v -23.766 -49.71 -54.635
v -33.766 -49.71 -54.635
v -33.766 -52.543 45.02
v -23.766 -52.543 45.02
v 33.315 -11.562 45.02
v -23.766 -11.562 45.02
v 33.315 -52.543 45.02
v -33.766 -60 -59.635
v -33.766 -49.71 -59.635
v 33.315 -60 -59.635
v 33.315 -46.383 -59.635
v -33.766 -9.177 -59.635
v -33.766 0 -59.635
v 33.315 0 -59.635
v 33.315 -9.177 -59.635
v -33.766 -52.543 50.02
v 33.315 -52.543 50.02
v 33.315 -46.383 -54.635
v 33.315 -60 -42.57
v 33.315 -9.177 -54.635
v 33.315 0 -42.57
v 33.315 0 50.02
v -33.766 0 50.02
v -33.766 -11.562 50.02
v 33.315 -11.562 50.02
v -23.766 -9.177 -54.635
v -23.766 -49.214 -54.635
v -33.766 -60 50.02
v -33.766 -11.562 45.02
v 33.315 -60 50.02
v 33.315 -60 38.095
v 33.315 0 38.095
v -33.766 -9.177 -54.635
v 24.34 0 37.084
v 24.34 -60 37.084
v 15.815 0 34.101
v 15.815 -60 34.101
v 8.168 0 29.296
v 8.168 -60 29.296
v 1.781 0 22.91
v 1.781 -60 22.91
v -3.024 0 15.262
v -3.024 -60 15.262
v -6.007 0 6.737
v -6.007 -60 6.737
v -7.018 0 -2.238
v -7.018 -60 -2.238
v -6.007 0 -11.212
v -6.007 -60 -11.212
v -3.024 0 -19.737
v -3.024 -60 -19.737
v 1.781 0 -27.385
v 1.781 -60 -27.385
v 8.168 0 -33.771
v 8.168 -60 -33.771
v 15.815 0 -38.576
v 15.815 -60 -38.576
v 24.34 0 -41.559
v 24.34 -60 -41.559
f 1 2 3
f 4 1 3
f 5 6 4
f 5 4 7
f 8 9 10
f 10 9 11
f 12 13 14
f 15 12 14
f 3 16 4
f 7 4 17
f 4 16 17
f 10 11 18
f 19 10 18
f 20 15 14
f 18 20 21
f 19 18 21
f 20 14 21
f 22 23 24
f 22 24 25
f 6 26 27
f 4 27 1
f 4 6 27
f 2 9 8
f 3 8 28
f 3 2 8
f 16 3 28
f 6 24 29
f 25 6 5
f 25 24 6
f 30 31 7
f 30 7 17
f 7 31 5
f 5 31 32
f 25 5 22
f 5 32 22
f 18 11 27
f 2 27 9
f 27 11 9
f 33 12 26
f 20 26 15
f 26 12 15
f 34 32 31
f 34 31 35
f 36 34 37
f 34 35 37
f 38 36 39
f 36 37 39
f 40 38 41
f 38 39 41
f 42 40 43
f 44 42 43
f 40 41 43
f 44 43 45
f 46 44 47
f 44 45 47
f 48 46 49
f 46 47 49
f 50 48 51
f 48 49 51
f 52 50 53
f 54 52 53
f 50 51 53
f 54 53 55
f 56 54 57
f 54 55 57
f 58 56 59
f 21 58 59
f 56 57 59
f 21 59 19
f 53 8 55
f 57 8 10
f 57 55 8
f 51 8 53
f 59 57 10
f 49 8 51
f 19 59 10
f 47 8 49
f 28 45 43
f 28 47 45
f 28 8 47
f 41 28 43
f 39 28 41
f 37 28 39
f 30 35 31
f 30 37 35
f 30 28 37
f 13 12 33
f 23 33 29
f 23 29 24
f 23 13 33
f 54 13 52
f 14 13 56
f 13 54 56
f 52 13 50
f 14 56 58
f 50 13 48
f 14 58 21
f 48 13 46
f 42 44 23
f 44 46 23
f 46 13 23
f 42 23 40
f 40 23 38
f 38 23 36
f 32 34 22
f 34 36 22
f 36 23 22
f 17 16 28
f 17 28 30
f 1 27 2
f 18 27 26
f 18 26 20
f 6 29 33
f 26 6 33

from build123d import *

# Parameters (mm, degrees)
F0_W     = 67.0811040951
F0_H     = 109.6547991037
F1_DEPTH = 60
F2_R     = 40.3328803273
F3_DEPTH = 60
F4_W     = 67.0811040951
F4_H     = 40.9807842225
F5_DEPTH = 5
F7_DEPTH = 5
F9_DEPTH = 10


with BuildPart() as f1:
    # F0 (on Front) → F1 (new body)
    with BuildSketch(Plane.XZ):
        with Locations((-0.2257995927, -4.8074126244)):
            Rectangle(F0_W, F0_H)
    extrude(amount=F1_DEPTH)

    # F2 (on face) → F3 (cut)
    with BuildSketch(Plane.XZ.offset(60)):
        with Locations((33.3147524549, -2.237562323)):
            Circle(F2_R)
    extrude(amount=-F3_DEPTH, mode=Mode.SUBTRACT)

    # F4 (on face) → F5 (cut)
    with BuildSketch(Plane.XY.offset(50.0199869275)):
        with Locations((-0.2257995927, -32.0525960997)):
            Rectangle(F4_W, F4_H)
    extrude(amount=-F5_DEPTH, mode=Mode.SUBTRACT)

    # F6 (on face) → F7 (cut)
    with BuildSketch(Plane(origin=(0, 0, -59.6348121762), x_dir=(1, 0, 0), z_dir=(0, 0, -1))):
        Polygon((-33.7663516402, 49.7098267078), (-33.7663516402, 9.1774007306), (33.3147524549, 9.1774007306), (33.3147524549, 46.3831014931), align=None)
    extrude(amount=-F7_DEPTH, mode=Mode.SUBTRACT)

    # F8 (on face) → F9 (cut)
    with BuildSketch(Plane(origin=(-33.7663516402, 0, 0), x_dir=(0, -1, 0), z_dir=(-1, 0, 0))):
        Polygon((52.5429882109, 45.0199869275), (11.5622039884, 45.0199869275), (9.1774007306, -54.6348121762), (49.7098267078, -54.6348121762), align=None)
    extrude(amount=-F9_DEPTH, mode=Mode.SUBTRACT)


solid = f1.part
